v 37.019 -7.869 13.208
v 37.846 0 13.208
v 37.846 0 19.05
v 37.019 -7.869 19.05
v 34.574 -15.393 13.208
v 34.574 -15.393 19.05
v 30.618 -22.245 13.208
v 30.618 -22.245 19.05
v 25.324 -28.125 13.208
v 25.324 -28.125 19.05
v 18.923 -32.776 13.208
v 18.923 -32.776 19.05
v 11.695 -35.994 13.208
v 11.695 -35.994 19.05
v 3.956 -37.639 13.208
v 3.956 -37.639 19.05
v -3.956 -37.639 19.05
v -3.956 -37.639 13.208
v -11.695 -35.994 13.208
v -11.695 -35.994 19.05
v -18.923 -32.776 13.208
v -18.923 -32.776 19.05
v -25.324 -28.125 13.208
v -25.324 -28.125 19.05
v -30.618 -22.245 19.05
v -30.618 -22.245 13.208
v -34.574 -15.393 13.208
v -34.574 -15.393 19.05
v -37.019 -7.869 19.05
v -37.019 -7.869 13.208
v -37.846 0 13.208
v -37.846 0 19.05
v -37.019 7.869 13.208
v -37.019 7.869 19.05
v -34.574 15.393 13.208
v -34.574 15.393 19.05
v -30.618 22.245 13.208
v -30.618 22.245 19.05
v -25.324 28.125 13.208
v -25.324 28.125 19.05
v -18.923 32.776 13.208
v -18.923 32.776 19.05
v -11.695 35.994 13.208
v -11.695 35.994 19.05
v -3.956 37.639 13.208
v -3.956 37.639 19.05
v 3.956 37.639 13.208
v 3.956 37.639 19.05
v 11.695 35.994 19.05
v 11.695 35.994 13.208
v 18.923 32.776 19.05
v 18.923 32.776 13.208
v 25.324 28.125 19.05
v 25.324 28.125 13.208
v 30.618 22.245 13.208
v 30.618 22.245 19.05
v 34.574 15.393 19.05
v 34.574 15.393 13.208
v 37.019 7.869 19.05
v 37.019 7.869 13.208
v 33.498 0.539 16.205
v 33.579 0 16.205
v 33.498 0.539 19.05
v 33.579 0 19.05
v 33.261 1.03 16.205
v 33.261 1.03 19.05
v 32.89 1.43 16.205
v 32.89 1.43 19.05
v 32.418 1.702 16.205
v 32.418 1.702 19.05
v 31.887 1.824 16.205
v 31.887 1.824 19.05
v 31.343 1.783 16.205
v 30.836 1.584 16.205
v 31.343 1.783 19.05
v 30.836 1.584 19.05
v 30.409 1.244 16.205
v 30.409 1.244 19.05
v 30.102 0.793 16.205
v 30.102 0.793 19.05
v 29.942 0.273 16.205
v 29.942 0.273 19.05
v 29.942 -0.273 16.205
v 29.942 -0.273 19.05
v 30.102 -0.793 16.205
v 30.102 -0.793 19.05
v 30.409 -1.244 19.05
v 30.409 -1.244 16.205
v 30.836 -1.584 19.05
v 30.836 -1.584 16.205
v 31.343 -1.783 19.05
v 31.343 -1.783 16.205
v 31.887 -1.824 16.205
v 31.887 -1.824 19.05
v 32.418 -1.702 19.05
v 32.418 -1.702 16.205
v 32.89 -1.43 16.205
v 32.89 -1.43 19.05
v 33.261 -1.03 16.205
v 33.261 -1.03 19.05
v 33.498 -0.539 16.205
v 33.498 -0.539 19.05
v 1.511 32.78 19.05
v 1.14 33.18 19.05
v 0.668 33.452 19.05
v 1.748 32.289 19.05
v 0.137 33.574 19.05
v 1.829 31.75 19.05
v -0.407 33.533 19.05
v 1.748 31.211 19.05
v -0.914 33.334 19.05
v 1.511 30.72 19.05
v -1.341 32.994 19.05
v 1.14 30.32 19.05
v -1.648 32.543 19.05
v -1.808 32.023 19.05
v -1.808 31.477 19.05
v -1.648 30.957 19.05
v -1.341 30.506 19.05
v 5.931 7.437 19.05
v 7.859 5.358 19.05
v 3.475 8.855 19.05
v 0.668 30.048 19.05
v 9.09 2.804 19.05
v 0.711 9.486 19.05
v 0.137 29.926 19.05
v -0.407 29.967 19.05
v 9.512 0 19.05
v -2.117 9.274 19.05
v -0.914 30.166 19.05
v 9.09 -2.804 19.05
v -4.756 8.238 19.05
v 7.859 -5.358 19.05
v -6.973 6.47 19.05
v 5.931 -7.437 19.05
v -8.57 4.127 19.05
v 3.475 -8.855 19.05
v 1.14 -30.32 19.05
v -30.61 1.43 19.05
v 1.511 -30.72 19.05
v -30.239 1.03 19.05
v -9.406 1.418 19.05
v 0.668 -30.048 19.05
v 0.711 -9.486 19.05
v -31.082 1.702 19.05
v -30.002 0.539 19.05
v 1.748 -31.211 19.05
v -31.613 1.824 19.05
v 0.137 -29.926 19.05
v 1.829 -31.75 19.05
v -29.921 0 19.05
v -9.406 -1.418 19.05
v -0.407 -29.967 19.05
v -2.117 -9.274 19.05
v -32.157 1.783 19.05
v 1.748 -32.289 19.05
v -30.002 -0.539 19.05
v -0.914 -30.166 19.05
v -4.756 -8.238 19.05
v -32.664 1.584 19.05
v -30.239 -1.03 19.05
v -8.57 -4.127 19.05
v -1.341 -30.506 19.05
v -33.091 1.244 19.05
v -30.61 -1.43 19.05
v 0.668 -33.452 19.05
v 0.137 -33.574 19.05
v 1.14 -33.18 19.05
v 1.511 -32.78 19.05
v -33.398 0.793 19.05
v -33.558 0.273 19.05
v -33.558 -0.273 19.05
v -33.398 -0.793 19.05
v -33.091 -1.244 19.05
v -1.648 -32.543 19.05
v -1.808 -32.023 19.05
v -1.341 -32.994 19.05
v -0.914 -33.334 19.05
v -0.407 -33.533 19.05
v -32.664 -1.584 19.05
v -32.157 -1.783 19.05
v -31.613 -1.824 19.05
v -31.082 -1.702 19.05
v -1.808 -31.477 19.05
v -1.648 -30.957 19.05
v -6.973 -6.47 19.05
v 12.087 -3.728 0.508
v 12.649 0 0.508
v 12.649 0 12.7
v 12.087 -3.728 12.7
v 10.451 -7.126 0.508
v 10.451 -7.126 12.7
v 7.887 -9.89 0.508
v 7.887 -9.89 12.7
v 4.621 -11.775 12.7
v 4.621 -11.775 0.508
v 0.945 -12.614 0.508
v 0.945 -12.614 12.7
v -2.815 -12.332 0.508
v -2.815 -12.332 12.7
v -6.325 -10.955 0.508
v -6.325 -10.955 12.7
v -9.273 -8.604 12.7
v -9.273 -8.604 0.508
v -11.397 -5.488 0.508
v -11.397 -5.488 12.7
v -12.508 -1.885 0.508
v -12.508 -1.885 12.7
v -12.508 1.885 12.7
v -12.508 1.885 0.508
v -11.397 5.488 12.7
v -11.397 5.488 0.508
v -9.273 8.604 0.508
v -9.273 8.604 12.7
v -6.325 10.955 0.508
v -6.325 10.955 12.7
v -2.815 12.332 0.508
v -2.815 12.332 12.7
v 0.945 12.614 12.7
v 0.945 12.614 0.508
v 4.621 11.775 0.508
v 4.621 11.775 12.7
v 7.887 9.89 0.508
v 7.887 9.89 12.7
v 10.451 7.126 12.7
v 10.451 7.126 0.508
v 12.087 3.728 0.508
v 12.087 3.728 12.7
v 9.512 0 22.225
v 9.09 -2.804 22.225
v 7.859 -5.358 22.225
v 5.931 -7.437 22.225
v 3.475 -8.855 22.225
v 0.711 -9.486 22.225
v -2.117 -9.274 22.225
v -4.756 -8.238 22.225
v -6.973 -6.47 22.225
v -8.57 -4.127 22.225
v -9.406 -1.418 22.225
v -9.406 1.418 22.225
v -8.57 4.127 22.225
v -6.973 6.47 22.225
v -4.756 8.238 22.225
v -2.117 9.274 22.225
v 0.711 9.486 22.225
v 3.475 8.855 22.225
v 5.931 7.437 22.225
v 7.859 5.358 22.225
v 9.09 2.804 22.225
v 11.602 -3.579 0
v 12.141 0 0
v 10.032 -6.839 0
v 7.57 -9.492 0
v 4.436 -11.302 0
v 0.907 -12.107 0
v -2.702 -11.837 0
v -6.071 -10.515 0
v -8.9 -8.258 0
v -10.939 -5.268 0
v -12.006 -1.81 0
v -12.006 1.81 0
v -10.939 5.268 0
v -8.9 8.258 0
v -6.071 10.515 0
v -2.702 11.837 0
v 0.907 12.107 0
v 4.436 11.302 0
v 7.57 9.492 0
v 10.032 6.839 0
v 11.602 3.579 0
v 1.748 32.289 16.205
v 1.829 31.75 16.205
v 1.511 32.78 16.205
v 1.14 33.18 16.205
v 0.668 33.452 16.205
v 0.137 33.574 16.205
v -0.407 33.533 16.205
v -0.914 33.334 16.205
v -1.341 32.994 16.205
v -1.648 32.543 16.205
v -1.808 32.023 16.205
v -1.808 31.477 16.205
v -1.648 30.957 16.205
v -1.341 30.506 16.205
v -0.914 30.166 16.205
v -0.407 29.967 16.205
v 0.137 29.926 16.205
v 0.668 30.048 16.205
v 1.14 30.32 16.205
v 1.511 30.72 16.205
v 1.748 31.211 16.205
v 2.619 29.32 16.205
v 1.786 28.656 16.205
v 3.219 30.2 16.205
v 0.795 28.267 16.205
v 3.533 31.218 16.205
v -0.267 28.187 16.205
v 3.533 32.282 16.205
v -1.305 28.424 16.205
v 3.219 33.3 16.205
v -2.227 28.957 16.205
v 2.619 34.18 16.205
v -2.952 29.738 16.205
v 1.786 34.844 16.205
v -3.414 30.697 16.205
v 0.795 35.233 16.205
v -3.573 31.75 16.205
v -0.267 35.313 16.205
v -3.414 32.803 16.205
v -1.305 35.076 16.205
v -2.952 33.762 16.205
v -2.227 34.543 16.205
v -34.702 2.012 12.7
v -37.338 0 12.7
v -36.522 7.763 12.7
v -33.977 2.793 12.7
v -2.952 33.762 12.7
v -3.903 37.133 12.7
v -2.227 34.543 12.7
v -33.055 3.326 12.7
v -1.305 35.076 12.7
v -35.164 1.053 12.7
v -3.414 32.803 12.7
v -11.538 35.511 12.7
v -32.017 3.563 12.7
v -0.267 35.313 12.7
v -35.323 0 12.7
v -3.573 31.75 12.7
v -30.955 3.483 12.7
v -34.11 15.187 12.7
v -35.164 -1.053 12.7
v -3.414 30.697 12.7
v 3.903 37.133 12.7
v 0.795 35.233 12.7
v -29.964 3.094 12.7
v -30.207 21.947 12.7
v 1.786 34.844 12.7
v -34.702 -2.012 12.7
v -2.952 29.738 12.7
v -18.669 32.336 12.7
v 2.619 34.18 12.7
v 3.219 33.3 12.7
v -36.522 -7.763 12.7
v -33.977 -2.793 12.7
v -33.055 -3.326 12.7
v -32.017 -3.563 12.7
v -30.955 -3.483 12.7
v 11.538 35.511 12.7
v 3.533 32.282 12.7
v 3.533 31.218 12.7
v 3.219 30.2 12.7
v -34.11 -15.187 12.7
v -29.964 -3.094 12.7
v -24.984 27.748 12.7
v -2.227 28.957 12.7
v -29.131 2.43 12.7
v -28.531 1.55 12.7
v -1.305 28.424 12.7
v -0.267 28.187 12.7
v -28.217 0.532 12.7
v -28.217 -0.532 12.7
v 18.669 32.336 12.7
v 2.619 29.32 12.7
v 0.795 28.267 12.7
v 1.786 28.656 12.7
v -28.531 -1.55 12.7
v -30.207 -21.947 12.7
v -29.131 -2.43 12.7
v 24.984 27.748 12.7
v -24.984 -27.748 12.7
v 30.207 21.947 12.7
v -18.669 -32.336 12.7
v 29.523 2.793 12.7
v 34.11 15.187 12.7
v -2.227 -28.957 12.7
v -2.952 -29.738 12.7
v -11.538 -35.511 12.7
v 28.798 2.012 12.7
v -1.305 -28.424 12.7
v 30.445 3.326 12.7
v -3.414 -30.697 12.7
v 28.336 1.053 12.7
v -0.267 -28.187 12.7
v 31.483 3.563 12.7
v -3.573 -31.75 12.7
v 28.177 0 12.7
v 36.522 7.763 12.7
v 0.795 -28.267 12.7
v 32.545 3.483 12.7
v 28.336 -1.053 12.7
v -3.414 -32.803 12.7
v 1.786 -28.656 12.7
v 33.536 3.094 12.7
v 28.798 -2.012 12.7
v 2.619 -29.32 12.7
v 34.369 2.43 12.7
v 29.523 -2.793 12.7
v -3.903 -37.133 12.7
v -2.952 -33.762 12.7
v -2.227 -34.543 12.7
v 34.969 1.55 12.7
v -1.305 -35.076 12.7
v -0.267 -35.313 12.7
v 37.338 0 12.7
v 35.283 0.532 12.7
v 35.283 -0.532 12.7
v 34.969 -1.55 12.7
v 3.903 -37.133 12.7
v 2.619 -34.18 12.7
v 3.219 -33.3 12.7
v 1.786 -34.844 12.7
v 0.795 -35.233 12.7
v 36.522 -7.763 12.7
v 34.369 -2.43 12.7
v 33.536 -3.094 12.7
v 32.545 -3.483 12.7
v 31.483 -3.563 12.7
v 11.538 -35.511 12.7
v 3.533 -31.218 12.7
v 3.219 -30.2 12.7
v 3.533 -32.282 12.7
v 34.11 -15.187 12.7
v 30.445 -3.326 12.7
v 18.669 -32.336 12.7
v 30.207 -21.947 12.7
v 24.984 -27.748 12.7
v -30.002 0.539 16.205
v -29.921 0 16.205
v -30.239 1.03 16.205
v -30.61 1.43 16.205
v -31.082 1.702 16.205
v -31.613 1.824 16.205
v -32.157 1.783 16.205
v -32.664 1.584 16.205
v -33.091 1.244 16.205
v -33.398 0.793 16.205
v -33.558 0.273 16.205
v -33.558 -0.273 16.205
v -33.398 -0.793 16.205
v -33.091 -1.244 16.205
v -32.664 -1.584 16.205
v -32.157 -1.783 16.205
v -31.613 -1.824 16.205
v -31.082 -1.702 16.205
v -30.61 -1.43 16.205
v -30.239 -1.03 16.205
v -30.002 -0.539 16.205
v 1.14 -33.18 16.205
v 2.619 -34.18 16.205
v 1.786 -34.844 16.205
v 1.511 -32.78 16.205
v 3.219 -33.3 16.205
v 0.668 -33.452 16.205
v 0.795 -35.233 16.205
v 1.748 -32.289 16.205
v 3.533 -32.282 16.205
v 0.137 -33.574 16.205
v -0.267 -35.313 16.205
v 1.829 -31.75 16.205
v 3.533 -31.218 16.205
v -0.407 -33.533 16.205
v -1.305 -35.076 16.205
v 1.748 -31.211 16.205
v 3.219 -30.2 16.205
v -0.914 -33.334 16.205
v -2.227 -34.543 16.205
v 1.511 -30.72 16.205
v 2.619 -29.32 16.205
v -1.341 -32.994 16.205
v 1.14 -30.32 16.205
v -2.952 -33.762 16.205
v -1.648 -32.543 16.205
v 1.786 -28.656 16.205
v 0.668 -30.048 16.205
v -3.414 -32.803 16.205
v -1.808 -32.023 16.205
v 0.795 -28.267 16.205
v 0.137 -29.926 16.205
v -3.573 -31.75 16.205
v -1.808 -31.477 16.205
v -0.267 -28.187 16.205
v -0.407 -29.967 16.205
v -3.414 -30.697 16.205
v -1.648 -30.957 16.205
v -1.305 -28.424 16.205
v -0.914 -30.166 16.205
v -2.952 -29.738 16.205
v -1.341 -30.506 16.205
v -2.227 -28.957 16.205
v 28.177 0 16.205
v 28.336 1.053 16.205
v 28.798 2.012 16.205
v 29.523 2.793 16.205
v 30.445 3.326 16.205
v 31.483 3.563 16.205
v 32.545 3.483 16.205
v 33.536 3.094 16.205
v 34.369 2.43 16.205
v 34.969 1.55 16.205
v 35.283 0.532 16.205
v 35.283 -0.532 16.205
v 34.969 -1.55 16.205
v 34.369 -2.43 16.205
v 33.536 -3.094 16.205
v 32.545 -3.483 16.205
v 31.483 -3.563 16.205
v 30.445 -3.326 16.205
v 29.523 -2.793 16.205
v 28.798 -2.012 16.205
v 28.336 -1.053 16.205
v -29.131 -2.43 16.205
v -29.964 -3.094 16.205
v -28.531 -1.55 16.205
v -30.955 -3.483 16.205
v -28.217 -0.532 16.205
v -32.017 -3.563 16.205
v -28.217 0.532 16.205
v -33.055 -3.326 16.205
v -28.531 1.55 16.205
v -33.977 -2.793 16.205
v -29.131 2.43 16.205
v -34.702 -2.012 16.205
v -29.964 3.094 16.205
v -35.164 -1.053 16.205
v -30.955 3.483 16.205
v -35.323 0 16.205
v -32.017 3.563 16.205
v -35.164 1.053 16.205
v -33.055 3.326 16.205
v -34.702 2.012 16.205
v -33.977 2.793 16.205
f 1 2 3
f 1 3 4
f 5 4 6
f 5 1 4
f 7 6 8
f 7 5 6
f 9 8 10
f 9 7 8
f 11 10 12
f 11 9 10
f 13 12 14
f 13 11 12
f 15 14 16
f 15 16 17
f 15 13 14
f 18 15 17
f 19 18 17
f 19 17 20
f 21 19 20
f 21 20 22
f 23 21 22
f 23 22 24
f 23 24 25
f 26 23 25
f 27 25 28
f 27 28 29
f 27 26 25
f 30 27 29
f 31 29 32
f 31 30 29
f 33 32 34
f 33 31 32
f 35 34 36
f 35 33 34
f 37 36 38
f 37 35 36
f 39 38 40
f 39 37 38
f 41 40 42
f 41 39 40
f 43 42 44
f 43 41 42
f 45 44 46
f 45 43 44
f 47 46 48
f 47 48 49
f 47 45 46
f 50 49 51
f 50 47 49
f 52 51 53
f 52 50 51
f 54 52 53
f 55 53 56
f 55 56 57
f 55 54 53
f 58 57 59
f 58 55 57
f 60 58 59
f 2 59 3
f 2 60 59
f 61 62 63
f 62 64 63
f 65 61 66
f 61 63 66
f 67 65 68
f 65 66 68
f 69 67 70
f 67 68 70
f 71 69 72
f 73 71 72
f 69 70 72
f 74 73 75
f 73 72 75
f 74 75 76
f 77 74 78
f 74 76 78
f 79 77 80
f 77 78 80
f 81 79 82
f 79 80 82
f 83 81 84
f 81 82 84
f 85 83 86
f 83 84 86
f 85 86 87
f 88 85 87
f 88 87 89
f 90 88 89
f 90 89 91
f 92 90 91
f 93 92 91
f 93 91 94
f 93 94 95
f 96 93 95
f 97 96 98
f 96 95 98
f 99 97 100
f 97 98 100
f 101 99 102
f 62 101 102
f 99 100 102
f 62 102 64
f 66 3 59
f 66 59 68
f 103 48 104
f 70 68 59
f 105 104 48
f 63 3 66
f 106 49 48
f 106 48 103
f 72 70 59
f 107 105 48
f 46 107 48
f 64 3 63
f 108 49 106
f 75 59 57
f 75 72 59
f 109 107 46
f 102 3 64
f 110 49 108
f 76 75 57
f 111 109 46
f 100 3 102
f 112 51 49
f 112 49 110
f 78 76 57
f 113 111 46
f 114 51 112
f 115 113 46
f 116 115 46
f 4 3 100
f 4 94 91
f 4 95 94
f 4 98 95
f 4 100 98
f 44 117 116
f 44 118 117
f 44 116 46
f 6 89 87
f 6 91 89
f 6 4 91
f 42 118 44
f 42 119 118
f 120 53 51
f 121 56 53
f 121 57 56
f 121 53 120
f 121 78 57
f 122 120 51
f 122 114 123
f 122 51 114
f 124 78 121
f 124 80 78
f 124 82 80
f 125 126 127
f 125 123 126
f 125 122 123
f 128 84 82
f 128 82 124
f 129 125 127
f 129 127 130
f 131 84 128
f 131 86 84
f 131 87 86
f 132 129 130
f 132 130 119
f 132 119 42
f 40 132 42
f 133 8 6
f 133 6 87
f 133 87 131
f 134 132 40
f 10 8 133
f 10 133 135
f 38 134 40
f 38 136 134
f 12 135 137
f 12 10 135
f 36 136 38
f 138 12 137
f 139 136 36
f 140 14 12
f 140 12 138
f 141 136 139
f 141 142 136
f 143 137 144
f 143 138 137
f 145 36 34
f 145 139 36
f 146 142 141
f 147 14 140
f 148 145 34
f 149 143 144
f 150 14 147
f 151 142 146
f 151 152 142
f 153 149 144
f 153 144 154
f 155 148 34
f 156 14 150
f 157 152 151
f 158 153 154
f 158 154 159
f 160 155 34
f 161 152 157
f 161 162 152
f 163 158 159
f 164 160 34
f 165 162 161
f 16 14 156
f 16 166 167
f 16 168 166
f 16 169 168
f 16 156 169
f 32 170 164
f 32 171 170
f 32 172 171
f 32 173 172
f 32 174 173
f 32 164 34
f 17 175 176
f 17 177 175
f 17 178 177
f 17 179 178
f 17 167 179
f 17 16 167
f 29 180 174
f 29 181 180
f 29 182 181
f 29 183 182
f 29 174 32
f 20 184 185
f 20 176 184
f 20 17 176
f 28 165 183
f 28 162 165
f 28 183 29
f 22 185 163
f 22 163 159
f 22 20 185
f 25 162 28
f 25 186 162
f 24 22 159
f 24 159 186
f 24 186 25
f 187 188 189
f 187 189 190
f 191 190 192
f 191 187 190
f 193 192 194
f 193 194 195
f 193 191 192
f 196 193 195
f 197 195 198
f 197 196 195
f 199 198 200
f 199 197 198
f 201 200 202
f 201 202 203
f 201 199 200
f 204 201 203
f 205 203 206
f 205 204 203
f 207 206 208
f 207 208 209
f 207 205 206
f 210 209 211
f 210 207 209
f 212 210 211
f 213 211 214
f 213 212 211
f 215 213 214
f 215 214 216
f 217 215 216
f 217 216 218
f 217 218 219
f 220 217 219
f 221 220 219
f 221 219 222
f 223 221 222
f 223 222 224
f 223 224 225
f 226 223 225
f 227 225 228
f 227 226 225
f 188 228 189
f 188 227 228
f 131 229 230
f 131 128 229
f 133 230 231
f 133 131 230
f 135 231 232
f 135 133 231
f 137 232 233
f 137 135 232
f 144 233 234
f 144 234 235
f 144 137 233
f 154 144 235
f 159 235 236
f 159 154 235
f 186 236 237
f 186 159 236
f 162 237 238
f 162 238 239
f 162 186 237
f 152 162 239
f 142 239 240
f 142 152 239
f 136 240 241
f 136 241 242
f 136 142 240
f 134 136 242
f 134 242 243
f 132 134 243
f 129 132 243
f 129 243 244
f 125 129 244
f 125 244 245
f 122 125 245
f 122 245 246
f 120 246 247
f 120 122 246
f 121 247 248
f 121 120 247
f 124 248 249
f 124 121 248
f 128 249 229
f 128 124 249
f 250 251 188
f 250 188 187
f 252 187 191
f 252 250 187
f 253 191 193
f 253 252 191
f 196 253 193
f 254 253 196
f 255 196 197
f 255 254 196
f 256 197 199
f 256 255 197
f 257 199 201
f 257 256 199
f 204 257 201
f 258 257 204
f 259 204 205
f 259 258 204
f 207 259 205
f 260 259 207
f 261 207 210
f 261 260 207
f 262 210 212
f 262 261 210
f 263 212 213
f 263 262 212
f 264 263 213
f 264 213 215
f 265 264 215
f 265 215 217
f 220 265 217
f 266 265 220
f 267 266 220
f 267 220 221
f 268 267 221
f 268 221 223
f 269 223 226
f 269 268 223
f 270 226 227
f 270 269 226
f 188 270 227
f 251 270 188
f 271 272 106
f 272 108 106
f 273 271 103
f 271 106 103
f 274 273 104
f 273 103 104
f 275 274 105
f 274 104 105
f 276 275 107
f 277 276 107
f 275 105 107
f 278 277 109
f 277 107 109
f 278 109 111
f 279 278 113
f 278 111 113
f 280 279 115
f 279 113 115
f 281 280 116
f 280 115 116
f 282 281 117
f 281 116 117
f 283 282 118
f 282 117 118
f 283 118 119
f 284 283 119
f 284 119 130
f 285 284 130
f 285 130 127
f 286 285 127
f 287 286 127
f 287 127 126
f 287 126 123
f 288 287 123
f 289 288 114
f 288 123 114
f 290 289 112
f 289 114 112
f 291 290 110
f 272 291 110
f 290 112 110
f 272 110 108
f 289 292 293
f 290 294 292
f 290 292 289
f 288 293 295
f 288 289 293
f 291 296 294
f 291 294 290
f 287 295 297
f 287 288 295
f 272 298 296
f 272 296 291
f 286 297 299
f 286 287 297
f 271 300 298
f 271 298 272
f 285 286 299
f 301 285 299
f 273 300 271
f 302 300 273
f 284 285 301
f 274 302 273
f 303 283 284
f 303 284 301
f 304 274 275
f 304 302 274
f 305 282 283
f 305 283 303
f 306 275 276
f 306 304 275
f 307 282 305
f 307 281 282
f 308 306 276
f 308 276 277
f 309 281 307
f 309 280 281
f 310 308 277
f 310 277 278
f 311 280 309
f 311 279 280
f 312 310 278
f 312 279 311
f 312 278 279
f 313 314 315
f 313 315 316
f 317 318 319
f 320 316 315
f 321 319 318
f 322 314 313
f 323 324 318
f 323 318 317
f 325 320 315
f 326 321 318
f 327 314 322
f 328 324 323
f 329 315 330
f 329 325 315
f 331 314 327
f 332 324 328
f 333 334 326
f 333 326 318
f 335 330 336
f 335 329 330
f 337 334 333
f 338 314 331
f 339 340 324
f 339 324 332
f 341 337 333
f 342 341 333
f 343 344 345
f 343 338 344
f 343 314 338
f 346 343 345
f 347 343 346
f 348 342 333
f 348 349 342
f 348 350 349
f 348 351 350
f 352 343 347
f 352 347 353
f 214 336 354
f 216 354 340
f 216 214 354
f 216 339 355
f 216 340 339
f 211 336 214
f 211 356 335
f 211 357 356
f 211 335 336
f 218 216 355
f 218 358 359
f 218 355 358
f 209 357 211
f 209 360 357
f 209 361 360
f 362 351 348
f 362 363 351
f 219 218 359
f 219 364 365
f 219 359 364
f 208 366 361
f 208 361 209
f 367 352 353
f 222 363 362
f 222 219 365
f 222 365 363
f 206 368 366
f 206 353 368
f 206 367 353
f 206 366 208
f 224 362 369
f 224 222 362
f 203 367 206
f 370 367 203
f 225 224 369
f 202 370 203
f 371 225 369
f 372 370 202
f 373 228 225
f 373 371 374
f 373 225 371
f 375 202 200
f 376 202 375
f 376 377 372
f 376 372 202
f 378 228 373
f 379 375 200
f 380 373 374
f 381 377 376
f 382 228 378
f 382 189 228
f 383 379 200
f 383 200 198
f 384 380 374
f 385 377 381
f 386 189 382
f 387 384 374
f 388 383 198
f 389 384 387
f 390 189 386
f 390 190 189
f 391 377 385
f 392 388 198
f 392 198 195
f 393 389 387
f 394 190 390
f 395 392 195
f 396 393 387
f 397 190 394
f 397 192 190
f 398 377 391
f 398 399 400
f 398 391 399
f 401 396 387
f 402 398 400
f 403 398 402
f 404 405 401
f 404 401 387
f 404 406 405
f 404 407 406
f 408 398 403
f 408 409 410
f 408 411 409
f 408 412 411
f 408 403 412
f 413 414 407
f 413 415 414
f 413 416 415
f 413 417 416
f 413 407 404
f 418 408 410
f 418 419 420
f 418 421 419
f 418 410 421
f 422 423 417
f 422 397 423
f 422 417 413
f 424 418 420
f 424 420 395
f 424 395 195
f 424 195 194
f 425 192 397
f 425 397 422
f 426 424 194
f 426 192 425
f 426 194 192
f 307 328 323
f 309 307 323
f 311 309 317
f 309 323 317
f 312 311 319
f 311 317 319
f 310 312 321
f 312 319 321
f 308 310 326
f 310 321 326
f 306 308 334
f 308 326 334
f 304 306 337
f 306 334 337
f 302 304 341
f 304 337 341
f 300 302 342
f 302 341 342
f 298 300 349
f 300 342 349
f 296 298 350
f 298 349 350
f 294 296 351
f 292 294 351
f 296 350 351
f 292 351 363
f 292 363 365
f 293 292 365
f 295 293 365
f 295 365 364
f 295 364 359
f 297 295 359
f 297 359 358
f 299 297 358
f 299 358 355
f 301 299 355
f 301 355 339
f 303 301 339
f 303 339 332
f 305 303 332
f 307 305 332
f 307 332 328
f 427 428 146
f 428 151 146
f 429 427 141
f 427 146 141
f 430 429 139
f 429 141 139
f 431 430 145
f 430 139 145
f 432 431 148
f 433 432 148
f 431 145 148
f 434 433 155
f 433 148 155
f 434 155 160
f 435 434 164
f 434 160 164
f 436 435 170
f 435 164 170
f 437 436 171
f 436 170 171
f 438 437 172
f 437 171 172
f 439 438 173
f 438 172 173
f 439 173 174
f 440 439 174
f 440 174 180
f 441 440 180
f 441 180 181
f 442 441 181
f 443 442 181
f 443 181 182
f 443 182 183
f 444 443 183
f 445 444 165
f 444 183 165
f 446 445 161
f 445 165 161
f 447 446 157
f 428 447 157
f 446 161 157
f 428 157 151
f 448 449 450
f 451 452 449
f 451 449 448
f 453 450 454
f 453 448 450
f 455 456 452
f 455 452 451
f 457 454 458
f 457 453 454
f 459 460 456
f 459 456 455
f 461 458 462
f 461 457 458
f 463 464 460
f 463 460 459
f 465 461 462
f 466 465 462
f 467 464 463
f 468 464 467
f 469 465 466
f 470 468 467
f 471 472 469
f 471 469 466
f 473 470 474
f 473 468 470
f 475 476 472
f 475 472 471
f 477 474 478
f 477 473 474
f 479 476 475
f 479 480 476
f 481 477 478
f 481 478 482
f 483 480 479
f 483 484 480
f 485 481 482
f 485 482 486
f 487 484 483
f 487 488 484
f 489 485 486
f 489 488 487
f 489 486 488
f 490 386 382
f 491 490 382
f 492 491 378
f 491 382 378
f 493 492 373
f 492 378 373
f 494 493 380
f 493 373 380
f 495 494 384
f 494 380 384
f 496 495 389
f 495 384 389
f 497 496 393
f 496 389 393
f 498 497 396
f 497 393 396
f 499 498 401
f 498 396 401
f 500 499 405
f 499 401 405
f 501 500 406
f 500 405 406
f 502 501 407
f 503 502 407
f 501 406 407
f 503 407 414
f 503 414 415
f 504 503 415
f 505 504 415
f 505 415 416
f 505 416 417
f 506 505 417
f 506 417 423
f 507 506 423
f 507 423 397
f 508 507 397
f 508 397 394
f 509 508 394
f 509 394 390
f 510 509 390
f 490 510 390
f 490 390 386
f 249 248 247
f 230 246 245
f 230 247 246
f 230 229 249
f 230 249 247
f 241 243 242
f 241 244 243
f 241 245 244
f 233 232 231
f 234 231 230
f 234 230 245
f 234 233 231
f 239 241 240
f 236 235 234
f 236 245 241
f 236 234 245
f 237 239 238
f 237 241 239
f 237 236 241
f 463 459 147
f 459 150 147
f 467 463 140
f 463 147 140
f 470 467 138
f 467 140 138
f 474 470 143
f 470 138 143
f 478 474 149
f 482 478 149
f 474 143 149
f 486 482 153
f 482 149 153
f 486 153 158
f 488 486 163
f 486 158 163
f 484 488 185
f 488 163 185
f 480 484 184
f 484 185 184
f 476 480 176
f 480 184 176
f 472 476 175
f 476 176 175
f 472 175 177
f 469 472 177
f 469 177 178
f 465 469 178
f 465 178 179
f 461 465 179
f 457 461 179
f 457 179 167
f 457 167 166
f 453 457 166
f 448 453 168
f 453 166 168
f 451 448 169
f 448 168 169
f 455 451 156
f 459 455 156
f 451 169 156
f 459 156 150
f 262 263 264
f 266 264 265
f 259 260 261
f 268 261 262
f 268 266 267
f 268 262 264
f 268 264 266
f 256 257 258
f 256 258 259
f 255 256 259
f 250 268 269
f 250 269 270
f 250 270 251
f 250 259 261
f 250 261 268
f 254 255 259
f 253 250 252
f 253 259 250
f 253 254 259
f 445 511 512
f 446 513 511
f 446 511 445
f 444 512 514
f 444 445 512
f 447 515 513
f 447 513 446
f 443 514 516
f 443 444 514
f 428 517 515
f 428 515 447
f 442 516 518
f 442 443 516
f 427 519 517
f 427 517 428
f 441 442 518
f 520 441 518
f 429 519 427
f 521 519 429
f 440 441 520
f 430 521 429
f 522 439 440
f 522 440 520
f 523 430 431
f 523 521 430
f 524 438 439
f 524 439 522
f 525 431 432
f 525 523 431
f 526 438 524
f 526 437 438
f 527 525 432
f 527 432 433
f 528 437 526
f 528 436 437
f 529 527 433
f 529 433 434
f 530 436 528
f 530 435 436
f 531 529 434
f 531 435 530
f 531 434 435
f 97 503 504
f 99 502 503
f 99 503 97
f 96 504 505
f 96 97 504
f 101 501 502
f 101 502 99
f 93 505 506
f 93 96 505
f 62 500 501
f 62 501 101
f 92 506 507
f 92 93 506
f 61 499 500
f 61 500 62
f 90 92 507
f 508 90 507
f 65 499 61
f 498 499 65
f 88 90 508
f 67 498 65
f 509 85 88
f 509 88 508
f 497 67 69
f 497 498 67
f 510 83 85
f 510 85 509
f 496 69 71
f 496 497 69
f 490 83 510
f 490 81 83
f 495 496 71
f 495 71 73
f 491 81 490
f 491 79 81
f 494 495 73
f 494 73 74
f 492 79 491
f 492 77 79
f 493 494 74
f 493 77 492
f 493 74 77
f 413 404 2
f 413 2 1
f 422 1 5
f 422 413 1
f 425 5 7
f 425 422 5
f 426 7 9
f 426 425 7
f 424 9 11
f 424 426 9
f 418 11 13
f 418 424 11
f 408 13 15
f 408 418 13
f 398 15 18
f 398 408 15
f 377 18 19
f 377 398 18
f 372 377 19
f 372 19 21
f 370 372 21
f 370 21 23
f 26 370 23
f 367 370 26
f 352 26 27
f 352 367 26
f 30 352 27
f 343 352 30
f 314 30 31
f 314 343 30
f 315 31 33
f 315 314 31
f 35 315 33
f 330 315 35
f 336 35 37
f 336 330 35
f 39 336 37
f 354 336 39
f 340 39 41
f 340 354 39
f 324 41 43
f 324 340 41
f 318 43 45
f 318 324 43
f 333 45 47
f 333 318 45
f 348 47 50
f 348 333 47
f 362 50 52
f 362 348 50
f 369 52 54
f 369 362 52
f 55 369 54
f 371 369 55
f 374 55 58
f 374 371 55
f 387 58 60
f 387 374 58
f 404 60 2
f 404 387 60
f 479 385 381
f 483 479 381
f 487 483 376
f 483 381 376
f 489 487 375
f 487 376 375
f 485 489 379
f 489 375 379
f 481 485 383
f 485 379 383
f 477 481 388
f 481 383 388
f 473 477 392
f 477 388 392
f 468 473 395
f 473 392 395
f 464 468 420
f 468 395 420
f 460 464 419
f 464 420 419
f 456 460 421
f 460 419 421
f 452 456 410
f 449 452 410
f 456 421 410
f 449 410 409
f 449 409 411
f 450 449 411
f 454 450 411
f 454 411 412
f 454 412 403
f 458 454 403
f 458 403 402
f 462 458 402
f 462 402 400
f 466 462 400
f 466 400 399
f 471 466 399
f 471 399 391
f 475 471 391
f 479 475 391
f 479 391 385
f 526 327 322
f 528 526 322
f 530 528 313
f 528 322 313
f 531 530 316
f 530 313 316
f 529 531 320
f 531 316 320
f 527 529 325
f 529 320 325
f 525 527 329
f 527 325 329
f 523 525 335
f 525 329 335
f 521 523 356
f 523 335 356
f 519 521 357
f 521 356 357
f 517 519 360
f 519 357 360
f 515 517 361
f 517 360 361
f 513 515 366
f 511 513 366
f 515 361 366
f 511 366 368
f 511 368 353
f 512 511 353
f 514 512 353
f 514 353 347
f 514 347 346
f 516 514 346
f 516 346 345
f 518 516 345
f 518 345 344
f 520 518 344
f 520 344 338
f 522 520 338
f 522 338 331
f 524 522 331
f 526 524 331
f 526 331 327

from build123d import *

# Parameters (mm, degrees)
CBORE_FOR_6_SOCKET_HEAD_CAP_SCREW1_D           = 3.6576
CBORE_FOR_6_SOCKET_HEAD_CAP_SCREW1_CBORE_D     = 7.14502
CBORE_FOR_6_SOCKET_HEAD_CAP_SCREW1_CBORE_DEPTH = 3.5052
CHAMFER1_SIZE                                  = 0.508


with BuildPart() as part:
    # Sketch1 → Revolve1 (revolve)
    with BuildSketch(Plane(origin=(0, 0, 0), x_dir=(0, 0, -1), z_dir=(1, 0, 0)), mode=Mode.PRIVATE) as revolve1_sk:
        Polygon((-22.225, 0), (-22.225, 9.5123), (-19.05, 9.5123), (-19.05, 37.846), (-12.7, 37.846), (-12.7, 12.6492), (0, 12.6492), (0, 0), align=None)
    revolve(revolve1_sk.sketch.rotate(Axis((0, 0, 22.225), (0, 0, -1)), 90), axis=Axis((0, 0, 22.225), (0, 0, -1)))

    # CBORE for #6 Socket Head Cap Screw1 (through all)
    with Locations(Plane(origin=(0, 0, 12.7), x_dir=(-1, 0, 0), z_dir=(0, 0, -1))):
        with Locations((-31.75, 0), (0, 31.75), (31.75, 0), (0, -31.75)):
            CounterBoreHole(CBORE_FOR_6_SOCKET_HEAD_CAP_SCREW1_D / 2, CBORE_FOR_6_SOCKET_HEAD_CAP_SCREW1_CBORE_D / 2, CBORE_FOR_6_SOCKET_HEAD_CAP_SCREW1_CBORE_DEPTH)

    # Chamfer1
    chamfer1_edges = [part.edges().sort_by_distance(p)[0] for p in [
        (-12.6492, 0, 0),
        (-37.846, 0, 12.7),
    ]]
    chamfer(chamfer1_edges, length=CHAMFER1_SIZE)


solid = part.part
